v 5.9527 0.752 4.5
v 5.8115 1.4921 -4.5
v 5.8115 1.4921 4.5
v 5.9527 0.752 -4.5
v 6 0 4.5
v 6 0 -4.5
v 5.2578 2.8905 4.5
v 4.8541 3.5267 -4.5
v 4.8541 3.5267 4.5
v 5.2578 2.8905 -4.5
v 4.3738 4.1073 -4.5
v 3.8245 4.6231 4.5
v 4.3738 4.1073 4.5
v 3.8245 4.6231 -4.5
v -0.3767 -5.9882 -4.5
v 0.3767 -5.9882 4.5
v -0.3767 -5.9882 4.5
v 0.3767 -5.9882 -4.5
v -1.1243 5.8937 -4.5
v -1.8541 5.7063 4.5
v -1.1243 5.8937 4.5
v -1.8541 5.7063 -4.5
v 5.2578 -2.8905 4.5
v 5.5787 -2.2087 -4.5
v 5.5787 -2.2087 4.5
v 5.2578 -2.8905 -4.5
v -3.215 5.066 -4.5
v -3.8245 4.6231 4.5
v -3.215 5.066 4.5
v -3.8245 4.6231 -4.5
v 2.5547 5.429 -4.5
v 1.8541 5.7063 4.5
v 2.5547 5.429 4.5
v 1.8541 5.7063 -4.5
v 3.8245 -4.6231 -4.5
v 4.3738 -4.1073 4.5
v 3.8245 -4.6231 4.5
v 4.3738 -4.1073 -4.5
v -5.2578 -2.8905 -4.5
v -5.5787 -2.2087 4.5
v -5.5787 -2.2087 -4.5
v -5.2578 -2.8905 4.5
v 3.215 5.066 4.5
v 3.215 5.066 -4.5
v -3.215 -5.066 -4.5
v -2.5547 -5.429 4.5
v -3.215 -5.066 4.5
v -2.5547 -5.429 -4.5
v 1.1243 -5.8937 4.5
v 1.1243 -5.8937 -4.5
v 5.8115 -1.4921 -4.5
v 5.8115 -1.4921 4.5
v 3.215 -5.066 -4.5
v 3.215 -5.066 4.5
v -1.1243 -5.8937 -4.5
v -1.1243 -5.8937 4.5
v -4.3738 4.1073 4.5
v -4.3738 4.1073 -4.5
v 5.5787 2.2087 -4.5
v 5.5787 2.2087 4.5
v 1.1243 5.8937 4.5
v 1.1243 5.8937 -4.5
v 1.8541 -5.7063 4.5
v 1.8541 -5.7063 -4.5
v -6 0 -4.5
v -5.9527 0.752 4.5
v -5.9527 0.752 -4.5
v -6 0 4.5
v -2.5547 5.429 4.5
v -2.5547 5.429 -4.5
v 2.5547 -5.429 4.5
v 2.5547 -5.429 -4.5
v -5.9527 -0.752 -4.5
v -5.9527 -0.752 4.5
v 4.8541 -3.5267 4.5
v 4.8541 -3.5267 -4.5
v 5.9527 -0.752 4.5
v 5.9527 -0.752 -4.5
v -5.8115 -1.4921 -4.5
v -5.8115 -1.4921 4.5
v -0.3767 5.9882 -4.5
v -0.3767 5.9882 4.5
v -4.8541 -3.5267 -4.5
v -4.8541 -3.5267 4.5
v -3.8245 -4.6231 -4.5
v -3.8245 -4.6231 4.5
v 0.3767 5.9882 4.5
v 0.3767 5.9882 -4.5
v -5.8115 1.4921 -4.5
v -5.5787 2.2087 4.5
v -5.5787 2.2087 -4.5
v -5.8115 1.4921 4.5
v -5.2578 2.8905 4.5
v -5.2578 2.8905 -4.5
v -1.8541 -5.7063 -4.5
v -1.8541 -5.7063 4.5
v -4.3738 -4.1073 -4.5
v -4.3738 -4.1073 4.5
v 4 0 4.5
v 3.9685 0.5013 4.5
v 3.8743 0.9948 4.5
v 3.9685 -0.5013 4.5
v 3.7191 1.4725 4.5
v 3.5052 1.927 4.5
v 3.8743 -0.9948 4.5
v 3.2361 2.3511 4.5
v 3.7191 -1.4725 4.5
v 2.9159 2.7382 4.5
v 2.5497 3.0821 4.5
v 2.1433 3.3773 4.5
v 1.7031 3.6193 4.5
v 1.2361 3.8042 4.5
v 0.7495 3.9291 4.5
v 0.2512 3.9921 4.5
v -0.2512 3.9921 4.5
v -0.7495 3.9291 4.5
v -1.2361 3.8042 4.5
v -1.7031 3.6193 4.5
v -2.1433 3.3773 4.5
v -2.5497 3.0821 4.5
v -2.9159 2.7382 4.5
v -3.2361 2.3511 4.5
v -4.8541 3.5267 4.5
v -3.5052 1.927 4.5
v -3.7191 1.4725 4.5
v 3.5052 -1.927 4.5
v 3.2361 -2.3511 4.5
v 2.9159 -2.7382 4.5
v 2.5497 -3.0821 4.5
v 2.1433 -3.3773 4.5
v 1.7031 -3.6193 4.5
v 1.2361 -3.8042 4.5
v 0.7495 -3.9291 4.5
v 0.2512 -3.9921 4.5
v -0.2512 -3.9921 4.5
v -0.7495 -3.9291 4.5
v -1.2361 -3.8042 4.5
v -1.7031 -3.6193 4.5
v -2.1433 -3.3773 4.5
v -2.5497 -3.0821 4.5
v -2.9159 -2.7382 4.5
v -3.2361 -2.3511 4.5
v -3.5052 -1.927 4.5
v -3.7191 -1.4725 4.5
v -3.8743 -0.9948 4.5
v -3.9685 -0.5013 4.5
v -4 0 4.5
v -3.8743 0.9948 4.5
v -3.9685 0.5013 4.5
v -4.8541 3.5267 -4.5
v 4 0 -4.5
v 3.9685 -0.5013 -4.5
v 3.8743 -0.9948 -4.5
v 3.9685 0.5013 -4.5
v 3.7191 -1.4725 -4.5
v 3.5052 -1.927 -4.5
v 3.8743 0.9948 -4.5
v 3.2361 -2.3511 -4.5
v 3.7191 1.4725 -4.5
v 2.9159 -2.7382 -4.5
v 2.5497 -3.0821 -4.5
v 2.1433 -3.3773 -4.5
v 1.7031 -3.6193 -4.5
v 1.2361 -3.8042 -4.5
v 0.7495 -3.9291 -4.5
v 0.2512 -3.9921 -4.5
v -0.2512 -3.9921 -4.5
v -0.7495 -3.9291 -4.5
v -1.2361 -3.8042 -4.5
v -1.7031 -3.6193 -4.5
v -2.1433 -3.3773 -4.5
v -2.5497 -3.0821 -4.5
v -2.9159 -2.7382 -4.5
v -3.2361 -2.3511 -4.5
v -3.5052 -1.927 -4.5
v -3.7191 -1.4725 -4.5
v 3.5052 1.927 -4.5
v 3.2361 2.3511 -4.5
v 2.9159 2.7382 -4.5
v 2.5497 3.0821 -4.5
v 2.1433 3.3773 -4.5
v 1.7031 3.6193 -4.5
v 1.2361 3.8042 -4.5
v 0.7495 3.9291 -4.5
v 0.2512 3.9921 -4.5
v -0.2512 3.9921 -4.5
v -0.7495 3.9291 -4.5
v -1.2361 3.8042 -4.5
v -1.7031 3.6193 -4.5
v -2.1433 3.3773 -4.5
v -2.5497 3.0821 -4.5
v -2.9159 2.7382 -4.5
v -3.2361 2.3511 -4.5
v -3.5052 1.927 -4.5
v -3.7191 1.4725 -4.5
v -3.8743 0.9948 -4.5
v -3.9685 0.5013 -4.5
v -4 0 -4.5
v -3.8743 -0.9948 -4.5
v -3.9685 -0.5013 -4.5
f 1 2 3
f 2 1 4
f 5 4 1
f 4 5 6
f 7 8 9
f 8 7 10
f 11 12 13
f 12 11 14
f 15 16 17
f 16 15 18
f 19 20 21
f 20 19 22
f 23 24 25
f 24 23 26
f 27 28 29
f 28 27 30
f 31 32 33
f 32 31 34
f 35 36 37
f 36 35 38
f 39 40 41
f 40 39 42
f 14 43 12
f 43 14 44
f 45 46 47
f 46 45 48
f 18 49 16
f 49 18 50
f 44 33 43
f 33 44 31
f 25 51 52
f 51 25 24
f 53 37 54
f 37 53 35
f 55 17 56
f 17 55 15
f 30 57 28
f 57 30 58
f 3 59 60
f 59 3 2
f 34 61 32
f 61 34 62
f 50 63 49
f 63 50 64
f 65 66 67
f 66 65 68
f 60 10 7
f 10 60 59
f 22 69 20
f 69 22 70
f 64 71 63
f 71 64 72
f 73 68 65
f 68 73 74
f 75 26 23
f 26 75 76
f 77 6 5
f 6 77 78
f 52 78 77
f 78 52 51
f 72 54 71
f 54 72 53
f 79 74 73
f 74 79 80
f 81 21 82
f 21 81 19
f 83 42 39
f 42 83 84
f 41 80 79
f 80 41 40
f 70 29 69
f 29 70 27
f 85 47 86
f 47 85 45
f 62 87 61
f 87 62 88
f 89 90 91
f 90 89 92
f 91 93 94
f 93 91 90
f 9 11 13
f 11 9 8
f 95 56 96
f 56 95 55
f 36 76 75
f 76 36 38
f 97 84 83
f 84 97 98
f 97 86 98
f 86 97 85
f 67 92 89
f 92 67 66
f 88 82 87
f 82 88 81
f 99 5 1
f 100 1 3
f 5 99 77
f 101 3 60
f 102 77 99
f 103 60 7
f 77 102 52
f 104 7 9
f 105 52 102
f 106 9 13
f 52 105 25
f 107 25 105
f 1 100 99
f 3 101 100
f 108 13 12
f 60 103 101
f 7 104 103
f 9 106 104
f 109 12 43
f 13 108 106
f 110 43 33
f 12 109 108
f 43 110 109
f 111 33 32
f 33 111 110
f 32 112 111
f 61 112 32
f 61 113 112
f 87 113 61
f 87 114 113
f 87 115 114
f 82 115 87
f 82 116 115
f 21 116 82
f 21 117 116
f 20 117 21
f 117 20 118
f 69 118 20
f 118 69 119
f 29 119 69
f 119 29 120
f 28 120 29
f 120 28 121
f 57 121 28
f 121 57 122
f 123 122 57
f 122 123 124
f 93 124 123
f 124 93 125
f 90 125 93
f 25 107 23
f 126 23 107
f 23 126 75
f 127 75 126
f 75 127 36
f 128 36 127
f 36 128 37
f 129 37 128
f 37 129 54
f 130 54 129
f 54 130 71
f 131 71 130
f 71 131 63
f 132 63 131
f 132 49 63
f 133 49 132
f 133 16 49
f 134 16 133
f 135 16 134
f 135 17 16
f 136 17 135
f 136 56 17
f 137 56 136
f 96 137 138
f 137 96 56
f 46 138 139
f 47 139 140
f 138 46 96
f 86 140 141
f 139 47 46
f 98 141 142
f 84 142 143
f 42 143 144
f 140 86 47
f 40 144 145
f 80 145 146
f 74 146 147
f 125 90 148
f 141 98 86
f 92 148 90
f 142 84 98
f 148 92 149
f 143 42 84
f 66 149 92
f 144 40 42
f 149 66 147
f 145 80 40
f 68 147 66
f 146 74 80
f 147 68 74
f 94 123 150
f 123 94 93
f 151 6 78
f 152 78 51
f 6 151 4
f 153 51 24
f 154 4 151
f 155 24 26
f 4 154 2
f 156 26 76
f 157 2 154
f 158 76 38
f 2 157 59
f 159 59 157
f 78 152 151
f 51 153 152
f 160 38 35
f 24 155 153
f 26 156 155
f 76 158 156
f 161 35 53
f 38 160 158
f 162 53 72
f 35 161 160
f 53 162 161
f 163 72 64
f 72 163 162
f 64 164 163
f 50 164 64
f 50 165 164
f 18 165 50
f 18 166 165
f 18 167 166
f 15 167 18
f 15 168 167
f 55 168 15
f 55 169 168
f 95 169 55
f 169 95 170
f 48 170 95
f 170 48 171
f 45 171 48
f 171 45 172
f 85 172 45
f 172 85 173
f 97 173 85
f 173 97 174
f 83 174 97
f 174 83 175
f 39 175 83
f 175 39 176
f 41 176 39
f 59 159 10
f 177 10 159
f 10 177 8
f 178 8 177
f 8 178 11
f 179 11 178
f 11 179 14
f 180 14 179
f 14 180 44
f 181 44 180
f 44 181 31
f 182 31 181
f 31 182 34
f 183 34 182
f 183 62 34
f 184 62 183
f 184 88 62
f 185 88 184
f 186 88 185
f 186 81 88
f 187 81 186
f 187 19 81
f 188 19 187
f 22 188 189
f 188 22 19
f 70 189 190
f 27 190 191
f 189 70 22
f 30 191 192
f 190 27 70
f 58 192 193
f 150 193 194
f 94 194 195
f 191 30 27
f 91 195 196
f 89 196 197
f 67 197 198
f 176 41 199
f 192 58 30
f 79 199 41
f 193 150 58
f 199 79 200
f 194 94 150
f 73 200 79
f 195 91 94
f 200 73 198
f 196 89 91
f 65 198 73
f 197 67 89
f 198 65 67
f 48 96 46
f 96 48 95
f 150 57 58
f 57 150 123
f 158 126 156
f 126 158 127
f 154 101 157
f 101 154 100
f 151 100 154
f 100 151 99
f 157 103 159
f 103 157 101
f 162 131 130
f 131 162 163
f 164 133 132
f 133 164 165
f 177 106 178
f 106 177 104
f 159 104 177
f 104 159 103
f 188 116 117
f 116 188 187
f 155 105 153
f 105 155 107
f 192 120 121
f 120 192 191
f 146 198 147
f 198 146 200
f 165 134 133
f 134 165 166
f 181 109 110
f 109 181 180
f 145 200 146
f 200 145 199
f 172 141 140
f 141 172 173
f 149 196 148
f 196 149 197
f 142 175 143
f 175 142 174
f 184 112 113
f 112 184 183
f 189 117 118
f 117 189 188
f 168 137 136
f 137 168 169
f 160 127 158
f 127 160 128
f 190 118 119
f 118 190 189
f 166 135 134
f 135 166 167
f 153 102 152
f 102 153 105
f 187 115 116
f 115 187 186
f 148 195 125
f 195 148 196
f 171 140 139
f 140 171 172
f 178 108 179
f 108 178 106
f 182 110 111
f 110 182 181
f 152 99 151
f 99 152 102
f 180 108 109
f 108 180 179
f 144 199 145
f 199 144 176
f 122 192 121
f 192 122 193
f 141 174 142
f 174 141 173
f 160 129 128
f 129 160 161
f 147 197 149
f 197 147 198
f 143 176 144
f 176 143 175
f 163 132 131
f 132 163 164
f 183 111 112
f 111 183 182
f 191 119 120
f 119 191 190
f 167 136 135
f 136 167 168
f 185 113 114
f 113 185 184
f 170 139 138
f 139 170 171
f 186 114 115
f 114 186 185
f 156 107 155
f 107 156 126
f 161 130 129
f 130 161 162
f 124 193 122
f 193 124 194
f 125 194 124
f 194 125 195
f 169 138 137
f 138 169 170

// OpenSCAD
$fn = 50;


difference() {
	union() {
		translate(v = [0, 0, -4.5000000000]) {
			cylinder(h = 9, r = 6.0000000000);
		}
	}
	union() {
		translate(v = [0, 0, -100.0000000000]) {
			cylinder(h = 200, r = 4.0000000000);
		}
	}
}
